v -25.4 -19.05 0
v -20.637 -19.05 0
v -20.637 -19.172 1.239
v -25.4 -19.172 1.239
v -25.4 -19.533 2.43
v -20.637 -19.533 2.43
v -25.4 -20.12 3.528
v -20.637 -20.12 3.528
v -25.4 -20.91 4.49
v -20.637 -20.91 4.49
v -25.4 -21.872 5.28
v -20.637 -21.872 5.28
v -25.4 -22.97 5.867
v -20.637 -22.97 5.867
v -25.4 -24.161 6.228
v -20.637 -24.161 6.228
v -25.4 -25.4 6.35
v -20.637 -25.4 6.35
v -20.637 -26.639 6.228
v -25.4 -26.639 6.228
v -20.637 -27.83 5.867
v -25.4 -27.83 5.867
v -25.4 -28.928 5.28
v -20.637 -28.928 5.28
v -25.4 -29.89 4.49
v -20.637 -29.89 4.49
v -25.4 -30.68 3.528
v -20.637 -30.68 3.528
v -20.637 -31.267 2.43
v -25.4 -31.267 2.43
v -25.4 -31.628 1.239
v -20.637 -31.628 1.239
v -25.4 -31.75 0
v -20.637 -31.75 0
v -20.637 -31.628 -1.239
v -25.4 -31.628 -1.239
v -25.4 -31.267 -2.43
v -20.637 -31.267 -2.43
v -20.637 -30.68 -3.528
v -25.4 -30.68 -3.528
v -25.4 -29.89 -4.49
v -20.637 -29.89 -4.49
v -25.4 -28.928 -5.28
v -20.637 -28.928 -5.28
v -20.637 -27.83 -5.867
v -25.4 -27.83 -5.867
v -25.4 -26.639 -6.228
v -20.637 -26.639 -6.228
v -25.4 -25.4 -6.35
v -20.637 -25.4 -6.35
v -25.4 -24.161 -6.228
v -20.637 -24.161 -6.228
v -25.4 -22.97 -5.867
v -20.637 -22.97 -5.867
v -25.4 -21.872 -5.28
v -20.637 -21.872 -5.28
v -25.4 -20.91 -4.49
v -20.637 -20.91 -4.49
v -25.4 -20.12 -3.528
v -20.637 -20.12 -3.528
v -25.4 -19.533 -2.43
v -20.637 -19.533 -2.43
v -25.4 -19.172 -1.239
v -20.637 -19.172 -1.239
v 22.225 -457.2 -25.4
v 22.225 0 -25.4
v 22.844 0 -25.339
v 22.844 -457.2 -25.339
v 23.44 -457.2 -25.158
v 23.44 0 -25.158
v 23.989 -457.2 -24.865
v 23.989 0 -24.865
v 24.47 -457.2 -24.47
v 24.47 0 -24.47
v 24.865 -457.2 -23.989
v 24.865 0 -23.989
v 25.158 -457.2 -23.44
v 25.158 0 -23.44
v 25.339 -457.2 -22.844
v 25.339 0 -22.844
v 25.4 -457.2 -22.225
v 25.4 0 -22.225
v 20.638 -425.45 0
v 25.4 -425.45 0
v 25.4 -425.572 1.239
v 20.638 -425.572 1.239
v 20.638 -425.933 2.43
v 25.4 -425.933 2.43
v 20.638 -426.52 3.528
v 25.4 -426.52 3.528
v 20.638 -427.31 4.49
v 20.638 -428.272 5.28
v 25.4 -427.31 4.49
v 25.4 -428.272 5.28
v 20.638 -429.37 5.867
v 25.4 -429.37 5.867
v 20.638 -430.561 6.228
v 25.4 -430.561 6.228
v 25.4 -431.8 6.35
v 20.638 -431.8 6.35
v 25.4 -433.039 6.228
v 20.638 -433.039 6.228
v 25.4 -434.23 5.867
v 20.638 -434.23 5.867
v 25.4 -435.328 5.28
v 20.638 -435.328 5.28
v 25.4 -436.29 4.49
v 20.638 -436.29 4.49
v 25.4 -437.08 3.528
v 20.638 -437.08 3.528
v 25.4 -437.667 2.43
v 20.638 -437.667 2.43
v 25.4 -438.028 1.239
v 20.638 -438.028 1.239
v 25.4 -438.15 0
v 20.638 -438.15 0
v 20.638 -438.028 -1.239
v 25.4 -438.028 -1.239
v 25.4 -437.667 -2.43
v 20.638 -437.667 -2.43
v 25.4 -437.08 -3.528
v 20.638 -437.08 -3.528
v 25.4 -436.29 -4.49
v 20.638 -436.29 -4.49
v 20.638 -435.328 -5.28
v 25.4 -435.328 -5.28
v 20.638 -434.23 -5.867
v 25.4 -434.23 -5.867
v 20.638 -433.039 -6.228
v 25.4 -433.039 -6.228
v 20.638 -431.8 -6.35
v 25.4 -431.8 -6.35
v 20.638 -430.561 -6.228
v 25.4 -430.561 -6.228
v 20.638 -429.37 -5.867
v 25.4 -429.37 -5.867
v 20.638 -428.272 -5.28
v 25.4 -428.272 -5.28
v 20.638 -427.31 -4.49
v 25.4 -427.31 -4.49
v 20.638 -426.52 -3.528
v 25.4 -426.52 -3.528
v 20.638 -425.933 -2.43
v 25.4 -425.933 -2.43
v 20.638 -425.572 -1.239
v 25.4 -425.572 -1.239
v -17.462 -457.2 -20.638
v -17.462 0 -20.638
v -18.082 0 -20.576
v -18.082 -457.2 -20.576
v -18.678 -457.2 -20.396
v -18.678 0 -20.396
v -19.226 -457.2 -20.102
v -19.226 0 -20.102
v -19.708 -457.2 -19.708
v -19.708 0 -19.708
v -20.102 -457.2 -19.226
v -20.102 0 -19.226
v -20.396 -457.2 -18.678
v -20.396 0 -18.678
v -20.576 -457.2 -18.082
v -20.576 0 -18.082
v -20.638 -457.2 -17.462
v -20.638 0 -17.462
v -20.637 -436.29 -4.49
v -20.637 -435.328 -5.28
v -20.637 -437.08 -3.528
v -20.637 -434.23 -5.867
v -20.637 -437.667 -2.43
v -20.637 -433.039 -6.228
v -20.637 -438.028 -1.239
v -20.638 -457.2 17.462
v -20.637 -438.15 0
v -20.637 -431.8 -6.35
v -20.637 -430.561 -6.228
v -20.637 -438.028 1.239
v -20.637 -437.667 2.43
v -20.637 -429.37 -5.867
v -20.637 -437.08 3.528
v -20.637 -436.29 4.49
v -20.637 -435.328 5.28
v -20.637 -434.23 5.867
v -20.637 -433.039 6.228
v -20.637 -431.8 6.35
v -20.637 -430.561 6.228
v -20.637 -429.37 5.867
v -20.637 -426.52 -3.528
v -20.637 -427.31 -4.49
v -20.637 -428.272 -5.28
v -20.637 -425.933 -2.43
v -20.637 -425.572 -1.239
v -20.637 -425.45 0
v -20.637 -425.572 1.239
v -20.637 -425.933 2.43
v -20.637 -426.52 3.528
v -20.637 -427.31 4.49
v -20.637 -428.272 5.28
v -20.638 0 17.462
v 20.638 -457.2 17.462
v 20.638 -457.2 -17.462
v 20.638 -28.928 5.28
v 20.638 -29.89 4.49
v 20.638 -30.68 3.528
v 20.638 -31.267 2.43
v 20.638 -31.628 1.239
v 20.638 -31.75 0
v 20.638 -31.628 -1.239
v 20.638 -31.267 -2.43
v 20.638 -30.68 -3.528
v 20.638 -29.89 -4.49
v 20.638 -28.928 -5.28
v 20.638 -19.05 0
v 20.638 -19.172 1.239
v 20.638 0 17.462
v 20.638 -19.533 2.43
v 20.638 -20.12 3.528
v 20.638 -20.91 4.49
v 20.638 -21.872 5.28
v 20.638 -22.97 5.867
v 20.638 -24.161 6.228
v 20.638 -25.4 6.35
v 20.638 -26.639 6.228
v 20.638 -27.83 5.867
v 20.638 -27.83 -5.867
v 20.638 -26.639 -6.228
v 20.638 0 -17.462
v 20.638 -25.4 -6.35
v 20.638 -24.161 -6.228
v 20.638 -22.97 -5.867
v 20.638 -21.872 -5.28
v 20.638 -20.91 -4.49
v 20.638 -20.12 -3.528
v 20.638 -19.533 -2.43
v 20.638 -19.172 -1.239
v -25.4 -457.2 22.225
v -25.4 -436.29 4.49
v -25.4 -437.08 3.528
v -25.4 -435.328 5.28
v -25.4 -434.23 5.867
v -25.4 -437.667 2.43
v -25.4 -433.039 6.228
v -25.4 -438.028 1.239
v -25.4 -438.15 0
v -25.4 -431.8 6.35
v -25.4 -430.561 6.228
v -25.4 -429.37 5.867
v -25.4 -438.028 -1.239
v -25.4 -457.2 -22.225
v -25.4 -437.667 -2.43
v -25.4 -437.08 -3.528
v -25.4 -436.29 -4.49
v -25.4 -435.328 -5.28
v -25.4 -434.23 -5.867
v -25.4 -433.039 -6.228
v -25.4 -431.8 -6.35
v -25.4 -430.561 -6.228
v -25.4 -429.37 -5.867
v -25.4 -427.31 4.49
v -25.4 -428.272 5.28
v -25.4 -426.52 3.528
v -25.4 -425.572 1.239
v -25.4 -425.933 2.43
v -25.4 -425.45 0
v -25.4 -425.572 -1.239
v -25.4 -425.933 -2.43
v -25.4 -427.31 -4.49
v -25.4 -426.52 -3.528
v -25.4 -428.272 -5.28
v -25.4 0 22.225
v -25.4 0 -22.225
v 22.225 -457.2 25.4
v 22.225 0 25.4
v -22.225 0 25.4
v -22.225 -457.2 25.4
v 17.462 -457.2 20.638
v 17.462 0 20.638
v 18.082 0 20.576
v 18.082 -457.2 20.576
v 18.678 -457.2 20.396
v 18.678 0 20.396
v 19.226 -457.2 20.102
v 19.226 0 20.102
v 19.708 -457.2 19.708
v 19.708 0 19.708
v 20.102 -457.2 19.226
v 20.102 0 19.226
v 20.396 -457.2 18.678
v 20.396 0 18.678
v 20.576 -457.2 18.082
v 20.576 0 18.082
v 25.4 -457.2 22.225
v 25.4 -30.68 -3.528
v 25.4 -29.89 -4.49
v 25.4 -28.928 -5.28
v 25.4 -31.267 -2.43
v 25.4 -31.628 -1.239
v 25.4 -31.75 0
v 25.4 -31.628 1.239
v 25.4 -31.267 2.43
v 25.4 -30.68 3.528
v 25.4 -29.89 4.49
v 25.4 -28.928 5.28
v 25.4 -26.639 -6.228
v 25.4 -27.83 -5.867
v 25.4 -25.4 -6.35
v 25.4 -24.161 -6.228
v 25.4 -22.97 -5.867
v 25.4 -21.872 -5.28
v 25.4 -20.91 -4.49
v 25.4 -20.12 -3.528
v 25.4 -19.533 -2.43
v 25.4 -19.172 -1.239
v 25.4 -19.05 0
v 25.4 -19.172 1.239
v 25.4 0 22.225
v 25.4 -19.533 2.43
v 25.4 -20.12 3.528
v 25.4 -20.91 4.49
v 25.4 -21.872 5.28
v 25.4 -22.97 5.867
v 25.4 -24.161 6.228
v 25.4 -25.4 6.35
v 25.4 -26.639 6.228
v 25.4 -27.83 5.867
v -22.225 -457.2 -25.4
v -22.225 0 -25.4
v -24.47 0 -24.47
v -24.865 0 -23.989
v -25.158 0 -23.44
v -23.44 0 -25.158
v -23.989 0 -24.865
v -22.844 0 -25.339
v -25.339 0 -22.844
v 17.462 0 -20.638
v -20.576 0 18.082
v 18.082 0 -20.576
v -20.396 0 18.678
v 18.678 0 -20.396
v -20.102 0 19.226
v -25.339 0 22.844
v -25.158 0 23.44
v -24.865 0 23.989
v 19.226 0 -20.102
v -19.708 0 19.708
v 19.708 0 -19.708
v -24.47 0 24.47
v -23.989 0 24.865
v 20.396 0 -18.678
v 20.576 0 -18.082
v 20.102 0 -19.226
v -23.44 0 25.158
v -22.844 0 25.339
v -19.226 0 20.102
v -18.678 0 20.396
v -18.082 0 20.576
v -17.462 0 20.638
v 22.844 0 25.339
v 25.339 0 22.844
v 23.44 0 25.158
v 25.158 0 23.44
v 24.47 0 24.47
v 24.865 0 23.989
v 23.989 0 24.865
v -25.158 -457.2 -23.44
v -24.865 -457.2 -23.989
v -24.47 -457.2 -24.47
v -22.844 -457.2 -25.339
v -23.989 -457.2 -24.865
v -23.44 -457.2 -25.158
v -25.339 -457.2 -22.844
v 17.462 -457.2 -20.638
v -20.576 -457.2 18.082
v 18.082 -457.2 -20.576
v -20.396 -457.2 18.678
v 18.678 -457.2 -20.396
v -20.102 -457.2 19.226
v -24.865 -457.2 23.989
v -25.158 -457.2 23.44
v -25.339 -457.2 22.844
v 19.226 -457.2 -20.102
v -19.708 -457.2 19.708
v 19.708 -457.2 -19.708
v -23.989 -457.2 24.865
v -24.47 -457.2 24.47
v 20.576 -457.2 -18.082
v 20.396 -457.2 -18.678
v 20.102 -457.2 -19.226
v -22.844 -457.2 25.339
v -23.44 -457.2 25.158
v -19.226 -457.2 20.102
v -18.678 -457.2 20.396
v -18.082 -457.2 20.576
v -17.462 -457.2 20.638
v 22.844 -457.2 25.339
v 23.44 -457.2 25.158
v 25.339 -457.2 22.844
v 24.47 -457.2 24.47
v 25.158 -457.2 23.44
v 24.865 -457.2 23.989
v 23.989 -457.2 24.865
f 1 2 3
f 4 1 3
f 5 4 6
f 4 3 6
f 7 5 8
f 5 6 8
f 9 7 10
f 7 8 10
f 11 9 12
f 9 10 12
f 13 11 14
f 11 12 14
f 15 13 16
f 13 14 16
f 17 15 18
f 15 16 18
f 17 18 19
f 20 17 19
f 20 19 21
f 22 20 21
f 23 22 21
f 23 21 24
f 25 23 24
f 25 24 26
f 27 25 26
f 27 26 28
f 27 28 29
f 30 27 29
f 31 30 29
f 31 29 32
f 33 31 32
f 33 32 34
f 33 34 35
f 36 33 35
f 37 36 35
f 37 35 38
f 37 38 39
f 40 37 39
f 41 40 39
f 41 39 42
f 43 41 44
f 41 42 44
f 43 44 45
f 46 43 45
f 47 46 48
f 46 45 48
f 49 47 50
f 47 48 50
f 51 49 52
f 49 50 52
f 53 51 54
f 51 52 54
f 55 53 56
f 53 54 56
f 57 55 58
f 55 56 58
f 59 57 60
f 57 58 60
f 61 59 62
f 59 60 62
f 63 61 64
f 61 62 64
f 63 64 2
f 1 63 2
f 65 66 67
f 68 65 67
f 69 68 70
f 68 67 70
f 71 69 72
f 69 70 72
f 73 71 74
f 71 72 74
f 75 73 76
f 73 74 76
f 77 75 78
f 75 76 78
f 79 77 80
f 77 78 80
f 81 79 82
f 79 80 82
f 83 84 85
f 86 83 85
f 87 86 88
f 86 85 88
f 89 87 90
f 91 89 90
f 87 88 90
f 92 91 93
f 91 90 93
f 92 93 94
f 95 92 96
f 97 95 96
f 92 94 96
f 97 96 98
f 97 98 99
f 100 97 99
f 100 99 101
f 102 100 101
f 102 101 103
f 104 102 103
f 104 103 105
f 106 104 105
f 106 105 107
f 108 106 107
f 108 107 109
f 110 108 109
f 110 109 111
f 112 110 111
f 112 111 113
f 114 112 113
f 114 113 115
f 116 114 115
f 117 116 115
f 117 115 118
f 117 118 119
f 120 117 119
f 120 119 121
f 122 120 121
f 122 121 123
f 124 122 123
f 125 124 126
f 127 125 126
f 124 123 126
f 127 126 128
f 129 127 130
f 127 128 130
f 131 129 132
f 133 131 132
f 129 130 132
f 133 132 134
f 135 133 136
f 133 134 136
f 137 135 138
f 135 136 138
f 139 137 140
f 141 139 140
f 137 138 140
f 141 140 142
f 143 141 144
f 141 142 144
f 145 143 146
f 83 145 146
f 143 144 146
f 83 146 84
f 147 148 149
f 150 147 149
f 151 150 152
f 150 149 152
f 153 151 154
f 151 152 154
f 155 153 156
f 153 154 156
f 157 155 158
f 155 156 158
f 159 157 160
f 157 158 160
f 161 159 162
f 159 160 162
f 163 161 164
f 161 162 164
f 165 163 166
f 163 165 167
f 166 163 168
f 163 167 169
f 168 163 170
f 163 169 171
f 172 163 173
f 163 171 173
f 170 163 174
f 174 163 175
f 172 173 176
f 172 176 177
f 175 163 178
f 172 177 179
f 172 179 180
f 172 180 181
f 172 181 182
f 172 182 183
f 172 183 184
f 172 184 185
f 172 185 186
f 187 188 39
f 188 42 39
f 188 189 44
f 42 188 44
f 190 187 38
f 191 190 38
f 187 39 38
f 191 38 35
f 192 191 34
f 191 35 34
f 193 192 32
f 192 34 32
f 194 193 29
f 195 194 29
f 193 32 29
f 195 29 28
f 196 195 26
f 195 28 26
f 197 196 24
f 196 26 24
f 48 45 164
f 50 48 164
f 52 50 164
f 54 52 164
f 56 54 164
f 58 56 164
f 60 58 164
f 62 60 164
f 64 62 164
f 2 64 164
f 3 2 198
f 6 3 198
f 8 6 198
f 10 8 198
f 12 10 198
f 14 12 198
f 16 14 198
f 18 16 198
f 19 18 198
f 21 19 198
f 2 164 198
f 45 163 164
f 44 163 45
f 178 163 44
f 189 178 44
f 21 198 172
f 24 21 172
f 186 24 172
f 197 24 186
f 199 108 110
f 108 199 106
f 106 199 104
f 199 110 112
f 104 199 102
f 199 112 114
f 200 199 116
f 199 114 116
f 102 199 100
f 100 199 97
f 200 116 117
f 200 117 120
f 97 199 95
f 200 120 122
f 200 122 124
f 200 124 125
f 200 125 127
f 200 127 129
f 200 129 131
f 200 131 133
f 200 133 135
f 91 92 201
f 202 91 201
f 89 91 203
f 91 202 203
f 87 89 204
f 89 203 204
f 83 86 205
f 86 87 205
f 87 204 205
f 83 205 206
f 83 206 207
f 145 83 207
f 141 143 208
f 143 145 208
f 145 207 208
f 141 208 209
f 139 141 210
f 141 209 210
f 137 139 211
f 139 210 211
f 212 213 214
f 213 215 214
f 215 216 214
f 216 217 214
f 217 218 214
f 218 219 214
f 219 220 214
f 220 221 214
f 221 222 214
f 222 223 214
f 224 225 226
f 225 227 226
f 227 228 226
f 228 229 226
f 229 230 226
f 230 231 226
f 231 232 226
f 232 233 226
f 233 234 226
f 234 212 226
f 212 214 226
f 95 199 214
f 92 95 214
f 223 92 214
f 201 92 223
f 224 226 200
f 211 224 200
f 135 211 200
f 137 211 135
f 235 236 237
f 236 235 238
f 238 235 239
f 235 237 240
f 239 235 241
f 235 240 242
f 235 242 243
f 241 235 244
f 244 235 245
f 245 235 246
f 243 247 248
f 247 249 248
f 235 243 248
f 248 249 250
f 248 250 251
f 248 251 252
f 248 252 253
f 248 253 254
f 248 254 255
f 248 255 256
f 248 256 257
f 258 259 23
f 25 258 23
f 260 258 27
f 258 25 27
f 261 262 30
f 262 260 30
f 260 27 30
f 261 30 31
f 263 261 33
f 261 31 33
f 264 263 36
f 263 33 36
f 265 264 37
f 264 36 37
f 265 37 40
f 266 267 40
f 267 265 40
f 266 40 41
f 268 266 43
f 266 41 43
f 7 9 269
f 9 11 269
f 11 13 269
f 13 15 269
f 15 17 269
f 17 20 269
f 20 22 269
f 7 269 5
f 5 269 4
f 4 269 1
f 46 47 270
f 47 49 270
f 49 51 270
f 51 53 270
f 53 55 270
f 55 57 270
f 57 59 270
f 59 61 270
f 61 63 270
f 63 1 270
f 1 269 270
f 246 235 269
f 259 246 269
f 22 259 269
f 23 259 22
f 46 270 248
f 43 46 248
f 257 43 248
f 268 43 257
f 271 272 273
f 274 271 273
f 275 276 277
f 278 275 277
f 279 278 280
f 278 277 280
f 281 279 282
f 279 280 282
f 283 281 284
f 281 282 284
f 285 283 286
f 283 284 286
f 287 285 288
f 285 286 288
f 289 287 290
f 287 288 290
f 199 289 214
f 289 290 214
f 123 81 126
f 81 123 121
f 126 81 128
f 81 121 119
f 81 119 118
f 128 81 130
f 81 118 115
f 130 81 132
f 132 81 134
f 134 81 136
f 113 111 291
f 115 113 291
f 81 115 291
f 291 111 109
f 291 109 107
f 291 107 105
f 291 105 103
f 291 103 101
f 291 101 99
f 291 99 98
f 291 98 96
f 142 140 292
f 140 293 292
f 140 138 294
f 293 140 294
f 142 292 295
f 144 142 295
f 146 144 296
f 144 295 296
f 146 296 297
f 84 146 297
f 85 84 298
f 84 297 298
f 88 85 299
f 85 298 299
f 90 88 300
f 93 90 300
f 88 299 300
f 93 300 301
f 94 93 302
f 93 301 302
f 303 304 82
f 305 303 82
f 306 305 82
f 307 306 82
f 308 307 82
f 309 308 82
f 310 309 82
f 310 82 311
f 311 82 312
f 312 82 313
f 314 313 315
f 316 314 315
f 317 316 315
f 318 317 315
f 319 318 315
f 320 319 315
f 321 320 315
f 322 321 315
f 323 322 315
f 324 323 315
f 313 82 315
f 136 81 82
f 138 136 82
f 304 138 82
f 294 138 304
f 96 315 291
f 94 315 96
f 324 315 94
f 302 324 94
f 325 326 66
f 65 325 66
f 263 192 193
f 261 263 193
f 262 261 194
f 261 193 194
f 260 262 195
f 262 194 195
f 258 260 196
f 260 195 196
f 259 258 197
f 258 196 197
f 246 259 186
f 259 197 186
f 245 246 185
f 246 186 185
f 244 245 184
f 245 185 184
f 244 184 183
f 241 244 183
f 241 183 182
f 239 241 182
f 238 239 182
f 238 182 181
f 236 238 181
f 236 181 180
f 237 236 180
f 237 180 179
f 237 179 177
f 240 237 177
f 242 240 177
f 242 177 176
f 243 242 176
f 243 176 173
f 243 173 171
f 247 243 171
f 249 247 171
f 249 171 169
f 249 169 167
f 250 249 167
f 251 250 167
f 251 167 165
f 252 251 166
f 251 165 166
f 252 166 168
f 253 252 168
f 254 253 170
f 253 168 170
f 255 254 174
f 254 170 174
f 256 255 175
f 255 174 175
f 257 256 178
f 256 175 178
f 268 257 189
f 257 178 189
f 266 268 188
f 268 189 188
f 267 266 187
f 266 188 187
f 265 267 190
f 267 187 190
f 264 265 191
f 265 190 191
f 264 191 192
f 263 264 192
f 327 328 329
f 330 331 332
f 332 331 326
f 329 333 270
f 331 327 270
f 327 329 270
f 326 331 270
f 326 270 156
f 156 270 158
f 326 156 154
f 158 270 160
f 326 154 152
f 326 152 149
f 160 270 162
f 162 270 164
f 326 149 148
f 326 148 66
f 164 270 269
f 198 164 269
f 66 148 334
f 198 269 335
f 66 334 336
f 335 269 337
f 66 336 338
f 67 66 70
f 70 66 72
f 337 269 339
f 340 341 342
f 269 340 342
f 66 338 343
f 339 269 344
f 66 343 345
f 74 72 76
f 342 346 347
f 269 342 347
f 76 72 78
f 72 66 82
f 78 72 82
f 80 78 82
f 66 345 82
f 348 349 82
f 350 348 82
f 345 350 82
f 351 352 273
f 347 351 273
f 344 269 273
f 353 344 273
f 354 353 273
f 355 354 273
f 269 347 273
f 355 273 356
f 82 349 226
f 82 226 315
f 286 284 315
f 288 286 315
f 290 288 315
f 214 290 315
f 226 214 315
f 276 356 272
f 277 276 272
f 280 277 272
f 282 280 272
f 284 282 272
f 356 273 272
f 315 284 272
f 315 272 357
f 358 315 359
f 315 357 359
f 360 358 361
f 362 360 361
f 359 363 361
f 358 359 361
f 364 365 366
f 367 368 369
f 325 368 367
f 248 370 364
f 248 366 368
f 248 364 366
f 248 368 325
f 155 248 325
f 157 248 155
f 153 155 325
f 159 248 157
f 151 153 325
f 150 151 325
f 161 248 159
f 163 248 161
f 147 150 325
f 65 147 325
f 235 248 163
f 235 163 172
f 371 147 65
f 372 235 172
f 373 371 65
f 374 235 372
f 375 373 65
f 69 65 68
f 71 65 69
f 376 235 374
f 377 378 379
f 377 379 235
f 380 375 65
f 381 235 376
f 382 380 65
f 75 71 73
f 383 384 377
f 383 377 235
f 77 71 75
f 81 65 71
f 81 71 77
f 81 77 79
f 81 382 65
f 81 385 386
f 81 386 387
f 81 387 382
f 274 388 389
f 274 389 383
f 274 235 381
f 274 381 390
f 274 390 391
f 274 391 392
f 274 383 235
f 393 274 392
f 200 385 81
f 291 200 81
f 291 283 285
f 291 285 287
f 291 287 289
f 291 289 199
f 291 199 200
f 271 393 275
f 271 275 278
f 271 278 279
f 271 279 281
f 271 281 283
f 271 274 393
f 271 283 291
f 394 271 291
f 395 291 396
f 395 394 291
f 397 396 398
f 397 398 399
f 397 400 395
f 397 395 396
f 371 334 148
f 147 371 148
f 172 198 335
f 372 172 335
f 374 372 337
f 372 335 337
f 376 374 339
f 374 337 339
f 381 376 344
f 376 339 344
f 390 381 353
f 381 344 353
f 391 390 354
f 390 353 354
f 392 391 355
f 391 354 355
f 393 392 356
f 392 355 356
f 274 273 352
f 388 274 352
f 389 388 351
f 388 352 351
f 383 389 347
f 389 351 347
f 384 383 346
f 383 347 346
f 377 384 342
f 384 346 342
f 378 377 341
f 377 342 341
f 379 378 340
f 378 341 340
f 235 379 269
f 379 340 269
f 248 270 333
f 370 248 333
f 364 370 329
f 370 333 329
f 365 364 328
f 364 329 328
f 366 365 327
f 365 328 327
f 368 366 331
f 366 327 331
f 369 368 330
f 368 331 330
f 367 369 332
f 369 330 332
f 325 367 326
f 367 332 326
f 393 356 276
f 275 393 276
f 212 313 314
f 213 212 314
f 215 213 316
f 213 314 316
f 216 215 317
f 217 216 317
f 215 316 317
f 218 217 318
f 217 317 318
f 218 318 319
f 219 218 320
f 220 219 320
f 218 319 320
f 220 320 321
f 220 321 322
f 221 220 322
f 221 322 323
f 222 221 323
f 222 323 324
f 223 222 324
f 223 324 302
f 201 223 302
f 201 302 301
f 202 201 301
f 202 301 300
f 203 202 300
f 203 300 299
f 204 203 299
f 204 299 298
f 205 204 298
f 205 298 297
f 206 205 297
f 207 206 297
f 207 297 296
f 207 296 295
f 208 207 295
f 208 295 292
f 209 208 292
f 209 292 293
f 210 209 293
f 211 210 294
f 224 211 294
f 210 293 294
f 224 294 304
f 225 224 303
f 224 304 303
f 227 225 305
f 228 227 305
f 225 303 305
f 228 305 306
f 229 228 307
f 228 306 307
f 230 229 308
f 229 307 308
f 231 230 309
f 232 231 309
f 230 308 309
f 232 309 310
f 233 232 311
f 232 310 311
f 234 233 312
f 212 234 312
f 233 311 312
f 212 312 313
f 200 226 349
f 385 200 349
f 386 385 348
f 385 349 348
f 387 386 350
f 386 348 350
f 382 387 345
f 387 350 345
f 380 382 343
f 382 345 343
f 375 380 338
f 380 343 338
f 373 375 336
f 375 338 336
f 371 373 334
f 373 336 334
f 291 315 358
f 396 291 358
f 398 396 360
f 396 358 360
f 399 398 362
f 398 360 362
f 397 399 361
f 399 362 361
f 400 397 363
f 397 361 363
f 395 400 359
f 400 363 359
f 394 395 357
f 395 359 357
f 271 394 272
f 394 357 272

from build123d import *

# Parameters (mm, degrees)
F1_DEPTH = 457.2
F2_R     = 6.35
F3_DEPTH = 50.801


with BuildPart() as f1:
    # F0 (on Front) → F1 (new body)
    with BuildSketch(Plane.XZ):
        with BuildLine():
            ThreePointArc((25.4, 22.225), (24.470064, 24.470064), (22.225, 25.4))
            Line((22.225, 25.4), (-22.225, 25.4))
            ThreePointArc((-22.225, 25.4), (-24.470064, 24.470064), (-25.4, 22.225))
            Line((-25.4, 22.225), (-25.4, -22.225))
            ThreePointArc((-25.4, -22.225), (-24.470064, -24.470064), (-22.225, -25.4))
            Line((-22.225, -25.4), (22.225, -25.4))
            ThreePointArc((22.225, -25.4), (24.470064, -24.470064), (25.4, -22.225))
            Line((25.4, -22.225), (25.4, 22.225))
        make_face()
        with BuildLine():
            Line((-17.4625, 20.6375), (17.4625, 20.6375))
            ThreePointArc((17.4625, 20.6375), (19.707564, 19.707564), (20.6375, 17.4625))
            Line((20.6375, 17.4625), (20.6375, -17.4625))
            ThreePointArc((20.6375, -17.4625), (19.707564, -19.707564), (17.4625, -20.6375))
            Line((17.4625, -20.6375), (-17.4625, -20.6375))
            ThreePointArc((-17.4625, -20.6375), (-19.707564, -19.707564), (-20.6375, -17.4625))
            Line((-20.6375, -17.4625), (-20.6375, 17.4625))
            ThreePointArc((-20.6375, 17.4625), (-19.707564, 19.707564), (-17.4625, 20.6375))
        make_face(mode=Mode.SUBTRACT)
    extrude(amount=F1_DEPTH)

    # F2 (on face) → F3 (cut, through all)
    with BuildSketch(Plane.YZ.offset(25.4)):
        with Locations((-431.8, 0)):
            Circle(F2_R)
        with Locations((-25.4, 0)):
            Circle(F2_R)
    extrude(amount=-F3_DEPTH, mode=Mode.SUBTRACT)


solid = f1.part
